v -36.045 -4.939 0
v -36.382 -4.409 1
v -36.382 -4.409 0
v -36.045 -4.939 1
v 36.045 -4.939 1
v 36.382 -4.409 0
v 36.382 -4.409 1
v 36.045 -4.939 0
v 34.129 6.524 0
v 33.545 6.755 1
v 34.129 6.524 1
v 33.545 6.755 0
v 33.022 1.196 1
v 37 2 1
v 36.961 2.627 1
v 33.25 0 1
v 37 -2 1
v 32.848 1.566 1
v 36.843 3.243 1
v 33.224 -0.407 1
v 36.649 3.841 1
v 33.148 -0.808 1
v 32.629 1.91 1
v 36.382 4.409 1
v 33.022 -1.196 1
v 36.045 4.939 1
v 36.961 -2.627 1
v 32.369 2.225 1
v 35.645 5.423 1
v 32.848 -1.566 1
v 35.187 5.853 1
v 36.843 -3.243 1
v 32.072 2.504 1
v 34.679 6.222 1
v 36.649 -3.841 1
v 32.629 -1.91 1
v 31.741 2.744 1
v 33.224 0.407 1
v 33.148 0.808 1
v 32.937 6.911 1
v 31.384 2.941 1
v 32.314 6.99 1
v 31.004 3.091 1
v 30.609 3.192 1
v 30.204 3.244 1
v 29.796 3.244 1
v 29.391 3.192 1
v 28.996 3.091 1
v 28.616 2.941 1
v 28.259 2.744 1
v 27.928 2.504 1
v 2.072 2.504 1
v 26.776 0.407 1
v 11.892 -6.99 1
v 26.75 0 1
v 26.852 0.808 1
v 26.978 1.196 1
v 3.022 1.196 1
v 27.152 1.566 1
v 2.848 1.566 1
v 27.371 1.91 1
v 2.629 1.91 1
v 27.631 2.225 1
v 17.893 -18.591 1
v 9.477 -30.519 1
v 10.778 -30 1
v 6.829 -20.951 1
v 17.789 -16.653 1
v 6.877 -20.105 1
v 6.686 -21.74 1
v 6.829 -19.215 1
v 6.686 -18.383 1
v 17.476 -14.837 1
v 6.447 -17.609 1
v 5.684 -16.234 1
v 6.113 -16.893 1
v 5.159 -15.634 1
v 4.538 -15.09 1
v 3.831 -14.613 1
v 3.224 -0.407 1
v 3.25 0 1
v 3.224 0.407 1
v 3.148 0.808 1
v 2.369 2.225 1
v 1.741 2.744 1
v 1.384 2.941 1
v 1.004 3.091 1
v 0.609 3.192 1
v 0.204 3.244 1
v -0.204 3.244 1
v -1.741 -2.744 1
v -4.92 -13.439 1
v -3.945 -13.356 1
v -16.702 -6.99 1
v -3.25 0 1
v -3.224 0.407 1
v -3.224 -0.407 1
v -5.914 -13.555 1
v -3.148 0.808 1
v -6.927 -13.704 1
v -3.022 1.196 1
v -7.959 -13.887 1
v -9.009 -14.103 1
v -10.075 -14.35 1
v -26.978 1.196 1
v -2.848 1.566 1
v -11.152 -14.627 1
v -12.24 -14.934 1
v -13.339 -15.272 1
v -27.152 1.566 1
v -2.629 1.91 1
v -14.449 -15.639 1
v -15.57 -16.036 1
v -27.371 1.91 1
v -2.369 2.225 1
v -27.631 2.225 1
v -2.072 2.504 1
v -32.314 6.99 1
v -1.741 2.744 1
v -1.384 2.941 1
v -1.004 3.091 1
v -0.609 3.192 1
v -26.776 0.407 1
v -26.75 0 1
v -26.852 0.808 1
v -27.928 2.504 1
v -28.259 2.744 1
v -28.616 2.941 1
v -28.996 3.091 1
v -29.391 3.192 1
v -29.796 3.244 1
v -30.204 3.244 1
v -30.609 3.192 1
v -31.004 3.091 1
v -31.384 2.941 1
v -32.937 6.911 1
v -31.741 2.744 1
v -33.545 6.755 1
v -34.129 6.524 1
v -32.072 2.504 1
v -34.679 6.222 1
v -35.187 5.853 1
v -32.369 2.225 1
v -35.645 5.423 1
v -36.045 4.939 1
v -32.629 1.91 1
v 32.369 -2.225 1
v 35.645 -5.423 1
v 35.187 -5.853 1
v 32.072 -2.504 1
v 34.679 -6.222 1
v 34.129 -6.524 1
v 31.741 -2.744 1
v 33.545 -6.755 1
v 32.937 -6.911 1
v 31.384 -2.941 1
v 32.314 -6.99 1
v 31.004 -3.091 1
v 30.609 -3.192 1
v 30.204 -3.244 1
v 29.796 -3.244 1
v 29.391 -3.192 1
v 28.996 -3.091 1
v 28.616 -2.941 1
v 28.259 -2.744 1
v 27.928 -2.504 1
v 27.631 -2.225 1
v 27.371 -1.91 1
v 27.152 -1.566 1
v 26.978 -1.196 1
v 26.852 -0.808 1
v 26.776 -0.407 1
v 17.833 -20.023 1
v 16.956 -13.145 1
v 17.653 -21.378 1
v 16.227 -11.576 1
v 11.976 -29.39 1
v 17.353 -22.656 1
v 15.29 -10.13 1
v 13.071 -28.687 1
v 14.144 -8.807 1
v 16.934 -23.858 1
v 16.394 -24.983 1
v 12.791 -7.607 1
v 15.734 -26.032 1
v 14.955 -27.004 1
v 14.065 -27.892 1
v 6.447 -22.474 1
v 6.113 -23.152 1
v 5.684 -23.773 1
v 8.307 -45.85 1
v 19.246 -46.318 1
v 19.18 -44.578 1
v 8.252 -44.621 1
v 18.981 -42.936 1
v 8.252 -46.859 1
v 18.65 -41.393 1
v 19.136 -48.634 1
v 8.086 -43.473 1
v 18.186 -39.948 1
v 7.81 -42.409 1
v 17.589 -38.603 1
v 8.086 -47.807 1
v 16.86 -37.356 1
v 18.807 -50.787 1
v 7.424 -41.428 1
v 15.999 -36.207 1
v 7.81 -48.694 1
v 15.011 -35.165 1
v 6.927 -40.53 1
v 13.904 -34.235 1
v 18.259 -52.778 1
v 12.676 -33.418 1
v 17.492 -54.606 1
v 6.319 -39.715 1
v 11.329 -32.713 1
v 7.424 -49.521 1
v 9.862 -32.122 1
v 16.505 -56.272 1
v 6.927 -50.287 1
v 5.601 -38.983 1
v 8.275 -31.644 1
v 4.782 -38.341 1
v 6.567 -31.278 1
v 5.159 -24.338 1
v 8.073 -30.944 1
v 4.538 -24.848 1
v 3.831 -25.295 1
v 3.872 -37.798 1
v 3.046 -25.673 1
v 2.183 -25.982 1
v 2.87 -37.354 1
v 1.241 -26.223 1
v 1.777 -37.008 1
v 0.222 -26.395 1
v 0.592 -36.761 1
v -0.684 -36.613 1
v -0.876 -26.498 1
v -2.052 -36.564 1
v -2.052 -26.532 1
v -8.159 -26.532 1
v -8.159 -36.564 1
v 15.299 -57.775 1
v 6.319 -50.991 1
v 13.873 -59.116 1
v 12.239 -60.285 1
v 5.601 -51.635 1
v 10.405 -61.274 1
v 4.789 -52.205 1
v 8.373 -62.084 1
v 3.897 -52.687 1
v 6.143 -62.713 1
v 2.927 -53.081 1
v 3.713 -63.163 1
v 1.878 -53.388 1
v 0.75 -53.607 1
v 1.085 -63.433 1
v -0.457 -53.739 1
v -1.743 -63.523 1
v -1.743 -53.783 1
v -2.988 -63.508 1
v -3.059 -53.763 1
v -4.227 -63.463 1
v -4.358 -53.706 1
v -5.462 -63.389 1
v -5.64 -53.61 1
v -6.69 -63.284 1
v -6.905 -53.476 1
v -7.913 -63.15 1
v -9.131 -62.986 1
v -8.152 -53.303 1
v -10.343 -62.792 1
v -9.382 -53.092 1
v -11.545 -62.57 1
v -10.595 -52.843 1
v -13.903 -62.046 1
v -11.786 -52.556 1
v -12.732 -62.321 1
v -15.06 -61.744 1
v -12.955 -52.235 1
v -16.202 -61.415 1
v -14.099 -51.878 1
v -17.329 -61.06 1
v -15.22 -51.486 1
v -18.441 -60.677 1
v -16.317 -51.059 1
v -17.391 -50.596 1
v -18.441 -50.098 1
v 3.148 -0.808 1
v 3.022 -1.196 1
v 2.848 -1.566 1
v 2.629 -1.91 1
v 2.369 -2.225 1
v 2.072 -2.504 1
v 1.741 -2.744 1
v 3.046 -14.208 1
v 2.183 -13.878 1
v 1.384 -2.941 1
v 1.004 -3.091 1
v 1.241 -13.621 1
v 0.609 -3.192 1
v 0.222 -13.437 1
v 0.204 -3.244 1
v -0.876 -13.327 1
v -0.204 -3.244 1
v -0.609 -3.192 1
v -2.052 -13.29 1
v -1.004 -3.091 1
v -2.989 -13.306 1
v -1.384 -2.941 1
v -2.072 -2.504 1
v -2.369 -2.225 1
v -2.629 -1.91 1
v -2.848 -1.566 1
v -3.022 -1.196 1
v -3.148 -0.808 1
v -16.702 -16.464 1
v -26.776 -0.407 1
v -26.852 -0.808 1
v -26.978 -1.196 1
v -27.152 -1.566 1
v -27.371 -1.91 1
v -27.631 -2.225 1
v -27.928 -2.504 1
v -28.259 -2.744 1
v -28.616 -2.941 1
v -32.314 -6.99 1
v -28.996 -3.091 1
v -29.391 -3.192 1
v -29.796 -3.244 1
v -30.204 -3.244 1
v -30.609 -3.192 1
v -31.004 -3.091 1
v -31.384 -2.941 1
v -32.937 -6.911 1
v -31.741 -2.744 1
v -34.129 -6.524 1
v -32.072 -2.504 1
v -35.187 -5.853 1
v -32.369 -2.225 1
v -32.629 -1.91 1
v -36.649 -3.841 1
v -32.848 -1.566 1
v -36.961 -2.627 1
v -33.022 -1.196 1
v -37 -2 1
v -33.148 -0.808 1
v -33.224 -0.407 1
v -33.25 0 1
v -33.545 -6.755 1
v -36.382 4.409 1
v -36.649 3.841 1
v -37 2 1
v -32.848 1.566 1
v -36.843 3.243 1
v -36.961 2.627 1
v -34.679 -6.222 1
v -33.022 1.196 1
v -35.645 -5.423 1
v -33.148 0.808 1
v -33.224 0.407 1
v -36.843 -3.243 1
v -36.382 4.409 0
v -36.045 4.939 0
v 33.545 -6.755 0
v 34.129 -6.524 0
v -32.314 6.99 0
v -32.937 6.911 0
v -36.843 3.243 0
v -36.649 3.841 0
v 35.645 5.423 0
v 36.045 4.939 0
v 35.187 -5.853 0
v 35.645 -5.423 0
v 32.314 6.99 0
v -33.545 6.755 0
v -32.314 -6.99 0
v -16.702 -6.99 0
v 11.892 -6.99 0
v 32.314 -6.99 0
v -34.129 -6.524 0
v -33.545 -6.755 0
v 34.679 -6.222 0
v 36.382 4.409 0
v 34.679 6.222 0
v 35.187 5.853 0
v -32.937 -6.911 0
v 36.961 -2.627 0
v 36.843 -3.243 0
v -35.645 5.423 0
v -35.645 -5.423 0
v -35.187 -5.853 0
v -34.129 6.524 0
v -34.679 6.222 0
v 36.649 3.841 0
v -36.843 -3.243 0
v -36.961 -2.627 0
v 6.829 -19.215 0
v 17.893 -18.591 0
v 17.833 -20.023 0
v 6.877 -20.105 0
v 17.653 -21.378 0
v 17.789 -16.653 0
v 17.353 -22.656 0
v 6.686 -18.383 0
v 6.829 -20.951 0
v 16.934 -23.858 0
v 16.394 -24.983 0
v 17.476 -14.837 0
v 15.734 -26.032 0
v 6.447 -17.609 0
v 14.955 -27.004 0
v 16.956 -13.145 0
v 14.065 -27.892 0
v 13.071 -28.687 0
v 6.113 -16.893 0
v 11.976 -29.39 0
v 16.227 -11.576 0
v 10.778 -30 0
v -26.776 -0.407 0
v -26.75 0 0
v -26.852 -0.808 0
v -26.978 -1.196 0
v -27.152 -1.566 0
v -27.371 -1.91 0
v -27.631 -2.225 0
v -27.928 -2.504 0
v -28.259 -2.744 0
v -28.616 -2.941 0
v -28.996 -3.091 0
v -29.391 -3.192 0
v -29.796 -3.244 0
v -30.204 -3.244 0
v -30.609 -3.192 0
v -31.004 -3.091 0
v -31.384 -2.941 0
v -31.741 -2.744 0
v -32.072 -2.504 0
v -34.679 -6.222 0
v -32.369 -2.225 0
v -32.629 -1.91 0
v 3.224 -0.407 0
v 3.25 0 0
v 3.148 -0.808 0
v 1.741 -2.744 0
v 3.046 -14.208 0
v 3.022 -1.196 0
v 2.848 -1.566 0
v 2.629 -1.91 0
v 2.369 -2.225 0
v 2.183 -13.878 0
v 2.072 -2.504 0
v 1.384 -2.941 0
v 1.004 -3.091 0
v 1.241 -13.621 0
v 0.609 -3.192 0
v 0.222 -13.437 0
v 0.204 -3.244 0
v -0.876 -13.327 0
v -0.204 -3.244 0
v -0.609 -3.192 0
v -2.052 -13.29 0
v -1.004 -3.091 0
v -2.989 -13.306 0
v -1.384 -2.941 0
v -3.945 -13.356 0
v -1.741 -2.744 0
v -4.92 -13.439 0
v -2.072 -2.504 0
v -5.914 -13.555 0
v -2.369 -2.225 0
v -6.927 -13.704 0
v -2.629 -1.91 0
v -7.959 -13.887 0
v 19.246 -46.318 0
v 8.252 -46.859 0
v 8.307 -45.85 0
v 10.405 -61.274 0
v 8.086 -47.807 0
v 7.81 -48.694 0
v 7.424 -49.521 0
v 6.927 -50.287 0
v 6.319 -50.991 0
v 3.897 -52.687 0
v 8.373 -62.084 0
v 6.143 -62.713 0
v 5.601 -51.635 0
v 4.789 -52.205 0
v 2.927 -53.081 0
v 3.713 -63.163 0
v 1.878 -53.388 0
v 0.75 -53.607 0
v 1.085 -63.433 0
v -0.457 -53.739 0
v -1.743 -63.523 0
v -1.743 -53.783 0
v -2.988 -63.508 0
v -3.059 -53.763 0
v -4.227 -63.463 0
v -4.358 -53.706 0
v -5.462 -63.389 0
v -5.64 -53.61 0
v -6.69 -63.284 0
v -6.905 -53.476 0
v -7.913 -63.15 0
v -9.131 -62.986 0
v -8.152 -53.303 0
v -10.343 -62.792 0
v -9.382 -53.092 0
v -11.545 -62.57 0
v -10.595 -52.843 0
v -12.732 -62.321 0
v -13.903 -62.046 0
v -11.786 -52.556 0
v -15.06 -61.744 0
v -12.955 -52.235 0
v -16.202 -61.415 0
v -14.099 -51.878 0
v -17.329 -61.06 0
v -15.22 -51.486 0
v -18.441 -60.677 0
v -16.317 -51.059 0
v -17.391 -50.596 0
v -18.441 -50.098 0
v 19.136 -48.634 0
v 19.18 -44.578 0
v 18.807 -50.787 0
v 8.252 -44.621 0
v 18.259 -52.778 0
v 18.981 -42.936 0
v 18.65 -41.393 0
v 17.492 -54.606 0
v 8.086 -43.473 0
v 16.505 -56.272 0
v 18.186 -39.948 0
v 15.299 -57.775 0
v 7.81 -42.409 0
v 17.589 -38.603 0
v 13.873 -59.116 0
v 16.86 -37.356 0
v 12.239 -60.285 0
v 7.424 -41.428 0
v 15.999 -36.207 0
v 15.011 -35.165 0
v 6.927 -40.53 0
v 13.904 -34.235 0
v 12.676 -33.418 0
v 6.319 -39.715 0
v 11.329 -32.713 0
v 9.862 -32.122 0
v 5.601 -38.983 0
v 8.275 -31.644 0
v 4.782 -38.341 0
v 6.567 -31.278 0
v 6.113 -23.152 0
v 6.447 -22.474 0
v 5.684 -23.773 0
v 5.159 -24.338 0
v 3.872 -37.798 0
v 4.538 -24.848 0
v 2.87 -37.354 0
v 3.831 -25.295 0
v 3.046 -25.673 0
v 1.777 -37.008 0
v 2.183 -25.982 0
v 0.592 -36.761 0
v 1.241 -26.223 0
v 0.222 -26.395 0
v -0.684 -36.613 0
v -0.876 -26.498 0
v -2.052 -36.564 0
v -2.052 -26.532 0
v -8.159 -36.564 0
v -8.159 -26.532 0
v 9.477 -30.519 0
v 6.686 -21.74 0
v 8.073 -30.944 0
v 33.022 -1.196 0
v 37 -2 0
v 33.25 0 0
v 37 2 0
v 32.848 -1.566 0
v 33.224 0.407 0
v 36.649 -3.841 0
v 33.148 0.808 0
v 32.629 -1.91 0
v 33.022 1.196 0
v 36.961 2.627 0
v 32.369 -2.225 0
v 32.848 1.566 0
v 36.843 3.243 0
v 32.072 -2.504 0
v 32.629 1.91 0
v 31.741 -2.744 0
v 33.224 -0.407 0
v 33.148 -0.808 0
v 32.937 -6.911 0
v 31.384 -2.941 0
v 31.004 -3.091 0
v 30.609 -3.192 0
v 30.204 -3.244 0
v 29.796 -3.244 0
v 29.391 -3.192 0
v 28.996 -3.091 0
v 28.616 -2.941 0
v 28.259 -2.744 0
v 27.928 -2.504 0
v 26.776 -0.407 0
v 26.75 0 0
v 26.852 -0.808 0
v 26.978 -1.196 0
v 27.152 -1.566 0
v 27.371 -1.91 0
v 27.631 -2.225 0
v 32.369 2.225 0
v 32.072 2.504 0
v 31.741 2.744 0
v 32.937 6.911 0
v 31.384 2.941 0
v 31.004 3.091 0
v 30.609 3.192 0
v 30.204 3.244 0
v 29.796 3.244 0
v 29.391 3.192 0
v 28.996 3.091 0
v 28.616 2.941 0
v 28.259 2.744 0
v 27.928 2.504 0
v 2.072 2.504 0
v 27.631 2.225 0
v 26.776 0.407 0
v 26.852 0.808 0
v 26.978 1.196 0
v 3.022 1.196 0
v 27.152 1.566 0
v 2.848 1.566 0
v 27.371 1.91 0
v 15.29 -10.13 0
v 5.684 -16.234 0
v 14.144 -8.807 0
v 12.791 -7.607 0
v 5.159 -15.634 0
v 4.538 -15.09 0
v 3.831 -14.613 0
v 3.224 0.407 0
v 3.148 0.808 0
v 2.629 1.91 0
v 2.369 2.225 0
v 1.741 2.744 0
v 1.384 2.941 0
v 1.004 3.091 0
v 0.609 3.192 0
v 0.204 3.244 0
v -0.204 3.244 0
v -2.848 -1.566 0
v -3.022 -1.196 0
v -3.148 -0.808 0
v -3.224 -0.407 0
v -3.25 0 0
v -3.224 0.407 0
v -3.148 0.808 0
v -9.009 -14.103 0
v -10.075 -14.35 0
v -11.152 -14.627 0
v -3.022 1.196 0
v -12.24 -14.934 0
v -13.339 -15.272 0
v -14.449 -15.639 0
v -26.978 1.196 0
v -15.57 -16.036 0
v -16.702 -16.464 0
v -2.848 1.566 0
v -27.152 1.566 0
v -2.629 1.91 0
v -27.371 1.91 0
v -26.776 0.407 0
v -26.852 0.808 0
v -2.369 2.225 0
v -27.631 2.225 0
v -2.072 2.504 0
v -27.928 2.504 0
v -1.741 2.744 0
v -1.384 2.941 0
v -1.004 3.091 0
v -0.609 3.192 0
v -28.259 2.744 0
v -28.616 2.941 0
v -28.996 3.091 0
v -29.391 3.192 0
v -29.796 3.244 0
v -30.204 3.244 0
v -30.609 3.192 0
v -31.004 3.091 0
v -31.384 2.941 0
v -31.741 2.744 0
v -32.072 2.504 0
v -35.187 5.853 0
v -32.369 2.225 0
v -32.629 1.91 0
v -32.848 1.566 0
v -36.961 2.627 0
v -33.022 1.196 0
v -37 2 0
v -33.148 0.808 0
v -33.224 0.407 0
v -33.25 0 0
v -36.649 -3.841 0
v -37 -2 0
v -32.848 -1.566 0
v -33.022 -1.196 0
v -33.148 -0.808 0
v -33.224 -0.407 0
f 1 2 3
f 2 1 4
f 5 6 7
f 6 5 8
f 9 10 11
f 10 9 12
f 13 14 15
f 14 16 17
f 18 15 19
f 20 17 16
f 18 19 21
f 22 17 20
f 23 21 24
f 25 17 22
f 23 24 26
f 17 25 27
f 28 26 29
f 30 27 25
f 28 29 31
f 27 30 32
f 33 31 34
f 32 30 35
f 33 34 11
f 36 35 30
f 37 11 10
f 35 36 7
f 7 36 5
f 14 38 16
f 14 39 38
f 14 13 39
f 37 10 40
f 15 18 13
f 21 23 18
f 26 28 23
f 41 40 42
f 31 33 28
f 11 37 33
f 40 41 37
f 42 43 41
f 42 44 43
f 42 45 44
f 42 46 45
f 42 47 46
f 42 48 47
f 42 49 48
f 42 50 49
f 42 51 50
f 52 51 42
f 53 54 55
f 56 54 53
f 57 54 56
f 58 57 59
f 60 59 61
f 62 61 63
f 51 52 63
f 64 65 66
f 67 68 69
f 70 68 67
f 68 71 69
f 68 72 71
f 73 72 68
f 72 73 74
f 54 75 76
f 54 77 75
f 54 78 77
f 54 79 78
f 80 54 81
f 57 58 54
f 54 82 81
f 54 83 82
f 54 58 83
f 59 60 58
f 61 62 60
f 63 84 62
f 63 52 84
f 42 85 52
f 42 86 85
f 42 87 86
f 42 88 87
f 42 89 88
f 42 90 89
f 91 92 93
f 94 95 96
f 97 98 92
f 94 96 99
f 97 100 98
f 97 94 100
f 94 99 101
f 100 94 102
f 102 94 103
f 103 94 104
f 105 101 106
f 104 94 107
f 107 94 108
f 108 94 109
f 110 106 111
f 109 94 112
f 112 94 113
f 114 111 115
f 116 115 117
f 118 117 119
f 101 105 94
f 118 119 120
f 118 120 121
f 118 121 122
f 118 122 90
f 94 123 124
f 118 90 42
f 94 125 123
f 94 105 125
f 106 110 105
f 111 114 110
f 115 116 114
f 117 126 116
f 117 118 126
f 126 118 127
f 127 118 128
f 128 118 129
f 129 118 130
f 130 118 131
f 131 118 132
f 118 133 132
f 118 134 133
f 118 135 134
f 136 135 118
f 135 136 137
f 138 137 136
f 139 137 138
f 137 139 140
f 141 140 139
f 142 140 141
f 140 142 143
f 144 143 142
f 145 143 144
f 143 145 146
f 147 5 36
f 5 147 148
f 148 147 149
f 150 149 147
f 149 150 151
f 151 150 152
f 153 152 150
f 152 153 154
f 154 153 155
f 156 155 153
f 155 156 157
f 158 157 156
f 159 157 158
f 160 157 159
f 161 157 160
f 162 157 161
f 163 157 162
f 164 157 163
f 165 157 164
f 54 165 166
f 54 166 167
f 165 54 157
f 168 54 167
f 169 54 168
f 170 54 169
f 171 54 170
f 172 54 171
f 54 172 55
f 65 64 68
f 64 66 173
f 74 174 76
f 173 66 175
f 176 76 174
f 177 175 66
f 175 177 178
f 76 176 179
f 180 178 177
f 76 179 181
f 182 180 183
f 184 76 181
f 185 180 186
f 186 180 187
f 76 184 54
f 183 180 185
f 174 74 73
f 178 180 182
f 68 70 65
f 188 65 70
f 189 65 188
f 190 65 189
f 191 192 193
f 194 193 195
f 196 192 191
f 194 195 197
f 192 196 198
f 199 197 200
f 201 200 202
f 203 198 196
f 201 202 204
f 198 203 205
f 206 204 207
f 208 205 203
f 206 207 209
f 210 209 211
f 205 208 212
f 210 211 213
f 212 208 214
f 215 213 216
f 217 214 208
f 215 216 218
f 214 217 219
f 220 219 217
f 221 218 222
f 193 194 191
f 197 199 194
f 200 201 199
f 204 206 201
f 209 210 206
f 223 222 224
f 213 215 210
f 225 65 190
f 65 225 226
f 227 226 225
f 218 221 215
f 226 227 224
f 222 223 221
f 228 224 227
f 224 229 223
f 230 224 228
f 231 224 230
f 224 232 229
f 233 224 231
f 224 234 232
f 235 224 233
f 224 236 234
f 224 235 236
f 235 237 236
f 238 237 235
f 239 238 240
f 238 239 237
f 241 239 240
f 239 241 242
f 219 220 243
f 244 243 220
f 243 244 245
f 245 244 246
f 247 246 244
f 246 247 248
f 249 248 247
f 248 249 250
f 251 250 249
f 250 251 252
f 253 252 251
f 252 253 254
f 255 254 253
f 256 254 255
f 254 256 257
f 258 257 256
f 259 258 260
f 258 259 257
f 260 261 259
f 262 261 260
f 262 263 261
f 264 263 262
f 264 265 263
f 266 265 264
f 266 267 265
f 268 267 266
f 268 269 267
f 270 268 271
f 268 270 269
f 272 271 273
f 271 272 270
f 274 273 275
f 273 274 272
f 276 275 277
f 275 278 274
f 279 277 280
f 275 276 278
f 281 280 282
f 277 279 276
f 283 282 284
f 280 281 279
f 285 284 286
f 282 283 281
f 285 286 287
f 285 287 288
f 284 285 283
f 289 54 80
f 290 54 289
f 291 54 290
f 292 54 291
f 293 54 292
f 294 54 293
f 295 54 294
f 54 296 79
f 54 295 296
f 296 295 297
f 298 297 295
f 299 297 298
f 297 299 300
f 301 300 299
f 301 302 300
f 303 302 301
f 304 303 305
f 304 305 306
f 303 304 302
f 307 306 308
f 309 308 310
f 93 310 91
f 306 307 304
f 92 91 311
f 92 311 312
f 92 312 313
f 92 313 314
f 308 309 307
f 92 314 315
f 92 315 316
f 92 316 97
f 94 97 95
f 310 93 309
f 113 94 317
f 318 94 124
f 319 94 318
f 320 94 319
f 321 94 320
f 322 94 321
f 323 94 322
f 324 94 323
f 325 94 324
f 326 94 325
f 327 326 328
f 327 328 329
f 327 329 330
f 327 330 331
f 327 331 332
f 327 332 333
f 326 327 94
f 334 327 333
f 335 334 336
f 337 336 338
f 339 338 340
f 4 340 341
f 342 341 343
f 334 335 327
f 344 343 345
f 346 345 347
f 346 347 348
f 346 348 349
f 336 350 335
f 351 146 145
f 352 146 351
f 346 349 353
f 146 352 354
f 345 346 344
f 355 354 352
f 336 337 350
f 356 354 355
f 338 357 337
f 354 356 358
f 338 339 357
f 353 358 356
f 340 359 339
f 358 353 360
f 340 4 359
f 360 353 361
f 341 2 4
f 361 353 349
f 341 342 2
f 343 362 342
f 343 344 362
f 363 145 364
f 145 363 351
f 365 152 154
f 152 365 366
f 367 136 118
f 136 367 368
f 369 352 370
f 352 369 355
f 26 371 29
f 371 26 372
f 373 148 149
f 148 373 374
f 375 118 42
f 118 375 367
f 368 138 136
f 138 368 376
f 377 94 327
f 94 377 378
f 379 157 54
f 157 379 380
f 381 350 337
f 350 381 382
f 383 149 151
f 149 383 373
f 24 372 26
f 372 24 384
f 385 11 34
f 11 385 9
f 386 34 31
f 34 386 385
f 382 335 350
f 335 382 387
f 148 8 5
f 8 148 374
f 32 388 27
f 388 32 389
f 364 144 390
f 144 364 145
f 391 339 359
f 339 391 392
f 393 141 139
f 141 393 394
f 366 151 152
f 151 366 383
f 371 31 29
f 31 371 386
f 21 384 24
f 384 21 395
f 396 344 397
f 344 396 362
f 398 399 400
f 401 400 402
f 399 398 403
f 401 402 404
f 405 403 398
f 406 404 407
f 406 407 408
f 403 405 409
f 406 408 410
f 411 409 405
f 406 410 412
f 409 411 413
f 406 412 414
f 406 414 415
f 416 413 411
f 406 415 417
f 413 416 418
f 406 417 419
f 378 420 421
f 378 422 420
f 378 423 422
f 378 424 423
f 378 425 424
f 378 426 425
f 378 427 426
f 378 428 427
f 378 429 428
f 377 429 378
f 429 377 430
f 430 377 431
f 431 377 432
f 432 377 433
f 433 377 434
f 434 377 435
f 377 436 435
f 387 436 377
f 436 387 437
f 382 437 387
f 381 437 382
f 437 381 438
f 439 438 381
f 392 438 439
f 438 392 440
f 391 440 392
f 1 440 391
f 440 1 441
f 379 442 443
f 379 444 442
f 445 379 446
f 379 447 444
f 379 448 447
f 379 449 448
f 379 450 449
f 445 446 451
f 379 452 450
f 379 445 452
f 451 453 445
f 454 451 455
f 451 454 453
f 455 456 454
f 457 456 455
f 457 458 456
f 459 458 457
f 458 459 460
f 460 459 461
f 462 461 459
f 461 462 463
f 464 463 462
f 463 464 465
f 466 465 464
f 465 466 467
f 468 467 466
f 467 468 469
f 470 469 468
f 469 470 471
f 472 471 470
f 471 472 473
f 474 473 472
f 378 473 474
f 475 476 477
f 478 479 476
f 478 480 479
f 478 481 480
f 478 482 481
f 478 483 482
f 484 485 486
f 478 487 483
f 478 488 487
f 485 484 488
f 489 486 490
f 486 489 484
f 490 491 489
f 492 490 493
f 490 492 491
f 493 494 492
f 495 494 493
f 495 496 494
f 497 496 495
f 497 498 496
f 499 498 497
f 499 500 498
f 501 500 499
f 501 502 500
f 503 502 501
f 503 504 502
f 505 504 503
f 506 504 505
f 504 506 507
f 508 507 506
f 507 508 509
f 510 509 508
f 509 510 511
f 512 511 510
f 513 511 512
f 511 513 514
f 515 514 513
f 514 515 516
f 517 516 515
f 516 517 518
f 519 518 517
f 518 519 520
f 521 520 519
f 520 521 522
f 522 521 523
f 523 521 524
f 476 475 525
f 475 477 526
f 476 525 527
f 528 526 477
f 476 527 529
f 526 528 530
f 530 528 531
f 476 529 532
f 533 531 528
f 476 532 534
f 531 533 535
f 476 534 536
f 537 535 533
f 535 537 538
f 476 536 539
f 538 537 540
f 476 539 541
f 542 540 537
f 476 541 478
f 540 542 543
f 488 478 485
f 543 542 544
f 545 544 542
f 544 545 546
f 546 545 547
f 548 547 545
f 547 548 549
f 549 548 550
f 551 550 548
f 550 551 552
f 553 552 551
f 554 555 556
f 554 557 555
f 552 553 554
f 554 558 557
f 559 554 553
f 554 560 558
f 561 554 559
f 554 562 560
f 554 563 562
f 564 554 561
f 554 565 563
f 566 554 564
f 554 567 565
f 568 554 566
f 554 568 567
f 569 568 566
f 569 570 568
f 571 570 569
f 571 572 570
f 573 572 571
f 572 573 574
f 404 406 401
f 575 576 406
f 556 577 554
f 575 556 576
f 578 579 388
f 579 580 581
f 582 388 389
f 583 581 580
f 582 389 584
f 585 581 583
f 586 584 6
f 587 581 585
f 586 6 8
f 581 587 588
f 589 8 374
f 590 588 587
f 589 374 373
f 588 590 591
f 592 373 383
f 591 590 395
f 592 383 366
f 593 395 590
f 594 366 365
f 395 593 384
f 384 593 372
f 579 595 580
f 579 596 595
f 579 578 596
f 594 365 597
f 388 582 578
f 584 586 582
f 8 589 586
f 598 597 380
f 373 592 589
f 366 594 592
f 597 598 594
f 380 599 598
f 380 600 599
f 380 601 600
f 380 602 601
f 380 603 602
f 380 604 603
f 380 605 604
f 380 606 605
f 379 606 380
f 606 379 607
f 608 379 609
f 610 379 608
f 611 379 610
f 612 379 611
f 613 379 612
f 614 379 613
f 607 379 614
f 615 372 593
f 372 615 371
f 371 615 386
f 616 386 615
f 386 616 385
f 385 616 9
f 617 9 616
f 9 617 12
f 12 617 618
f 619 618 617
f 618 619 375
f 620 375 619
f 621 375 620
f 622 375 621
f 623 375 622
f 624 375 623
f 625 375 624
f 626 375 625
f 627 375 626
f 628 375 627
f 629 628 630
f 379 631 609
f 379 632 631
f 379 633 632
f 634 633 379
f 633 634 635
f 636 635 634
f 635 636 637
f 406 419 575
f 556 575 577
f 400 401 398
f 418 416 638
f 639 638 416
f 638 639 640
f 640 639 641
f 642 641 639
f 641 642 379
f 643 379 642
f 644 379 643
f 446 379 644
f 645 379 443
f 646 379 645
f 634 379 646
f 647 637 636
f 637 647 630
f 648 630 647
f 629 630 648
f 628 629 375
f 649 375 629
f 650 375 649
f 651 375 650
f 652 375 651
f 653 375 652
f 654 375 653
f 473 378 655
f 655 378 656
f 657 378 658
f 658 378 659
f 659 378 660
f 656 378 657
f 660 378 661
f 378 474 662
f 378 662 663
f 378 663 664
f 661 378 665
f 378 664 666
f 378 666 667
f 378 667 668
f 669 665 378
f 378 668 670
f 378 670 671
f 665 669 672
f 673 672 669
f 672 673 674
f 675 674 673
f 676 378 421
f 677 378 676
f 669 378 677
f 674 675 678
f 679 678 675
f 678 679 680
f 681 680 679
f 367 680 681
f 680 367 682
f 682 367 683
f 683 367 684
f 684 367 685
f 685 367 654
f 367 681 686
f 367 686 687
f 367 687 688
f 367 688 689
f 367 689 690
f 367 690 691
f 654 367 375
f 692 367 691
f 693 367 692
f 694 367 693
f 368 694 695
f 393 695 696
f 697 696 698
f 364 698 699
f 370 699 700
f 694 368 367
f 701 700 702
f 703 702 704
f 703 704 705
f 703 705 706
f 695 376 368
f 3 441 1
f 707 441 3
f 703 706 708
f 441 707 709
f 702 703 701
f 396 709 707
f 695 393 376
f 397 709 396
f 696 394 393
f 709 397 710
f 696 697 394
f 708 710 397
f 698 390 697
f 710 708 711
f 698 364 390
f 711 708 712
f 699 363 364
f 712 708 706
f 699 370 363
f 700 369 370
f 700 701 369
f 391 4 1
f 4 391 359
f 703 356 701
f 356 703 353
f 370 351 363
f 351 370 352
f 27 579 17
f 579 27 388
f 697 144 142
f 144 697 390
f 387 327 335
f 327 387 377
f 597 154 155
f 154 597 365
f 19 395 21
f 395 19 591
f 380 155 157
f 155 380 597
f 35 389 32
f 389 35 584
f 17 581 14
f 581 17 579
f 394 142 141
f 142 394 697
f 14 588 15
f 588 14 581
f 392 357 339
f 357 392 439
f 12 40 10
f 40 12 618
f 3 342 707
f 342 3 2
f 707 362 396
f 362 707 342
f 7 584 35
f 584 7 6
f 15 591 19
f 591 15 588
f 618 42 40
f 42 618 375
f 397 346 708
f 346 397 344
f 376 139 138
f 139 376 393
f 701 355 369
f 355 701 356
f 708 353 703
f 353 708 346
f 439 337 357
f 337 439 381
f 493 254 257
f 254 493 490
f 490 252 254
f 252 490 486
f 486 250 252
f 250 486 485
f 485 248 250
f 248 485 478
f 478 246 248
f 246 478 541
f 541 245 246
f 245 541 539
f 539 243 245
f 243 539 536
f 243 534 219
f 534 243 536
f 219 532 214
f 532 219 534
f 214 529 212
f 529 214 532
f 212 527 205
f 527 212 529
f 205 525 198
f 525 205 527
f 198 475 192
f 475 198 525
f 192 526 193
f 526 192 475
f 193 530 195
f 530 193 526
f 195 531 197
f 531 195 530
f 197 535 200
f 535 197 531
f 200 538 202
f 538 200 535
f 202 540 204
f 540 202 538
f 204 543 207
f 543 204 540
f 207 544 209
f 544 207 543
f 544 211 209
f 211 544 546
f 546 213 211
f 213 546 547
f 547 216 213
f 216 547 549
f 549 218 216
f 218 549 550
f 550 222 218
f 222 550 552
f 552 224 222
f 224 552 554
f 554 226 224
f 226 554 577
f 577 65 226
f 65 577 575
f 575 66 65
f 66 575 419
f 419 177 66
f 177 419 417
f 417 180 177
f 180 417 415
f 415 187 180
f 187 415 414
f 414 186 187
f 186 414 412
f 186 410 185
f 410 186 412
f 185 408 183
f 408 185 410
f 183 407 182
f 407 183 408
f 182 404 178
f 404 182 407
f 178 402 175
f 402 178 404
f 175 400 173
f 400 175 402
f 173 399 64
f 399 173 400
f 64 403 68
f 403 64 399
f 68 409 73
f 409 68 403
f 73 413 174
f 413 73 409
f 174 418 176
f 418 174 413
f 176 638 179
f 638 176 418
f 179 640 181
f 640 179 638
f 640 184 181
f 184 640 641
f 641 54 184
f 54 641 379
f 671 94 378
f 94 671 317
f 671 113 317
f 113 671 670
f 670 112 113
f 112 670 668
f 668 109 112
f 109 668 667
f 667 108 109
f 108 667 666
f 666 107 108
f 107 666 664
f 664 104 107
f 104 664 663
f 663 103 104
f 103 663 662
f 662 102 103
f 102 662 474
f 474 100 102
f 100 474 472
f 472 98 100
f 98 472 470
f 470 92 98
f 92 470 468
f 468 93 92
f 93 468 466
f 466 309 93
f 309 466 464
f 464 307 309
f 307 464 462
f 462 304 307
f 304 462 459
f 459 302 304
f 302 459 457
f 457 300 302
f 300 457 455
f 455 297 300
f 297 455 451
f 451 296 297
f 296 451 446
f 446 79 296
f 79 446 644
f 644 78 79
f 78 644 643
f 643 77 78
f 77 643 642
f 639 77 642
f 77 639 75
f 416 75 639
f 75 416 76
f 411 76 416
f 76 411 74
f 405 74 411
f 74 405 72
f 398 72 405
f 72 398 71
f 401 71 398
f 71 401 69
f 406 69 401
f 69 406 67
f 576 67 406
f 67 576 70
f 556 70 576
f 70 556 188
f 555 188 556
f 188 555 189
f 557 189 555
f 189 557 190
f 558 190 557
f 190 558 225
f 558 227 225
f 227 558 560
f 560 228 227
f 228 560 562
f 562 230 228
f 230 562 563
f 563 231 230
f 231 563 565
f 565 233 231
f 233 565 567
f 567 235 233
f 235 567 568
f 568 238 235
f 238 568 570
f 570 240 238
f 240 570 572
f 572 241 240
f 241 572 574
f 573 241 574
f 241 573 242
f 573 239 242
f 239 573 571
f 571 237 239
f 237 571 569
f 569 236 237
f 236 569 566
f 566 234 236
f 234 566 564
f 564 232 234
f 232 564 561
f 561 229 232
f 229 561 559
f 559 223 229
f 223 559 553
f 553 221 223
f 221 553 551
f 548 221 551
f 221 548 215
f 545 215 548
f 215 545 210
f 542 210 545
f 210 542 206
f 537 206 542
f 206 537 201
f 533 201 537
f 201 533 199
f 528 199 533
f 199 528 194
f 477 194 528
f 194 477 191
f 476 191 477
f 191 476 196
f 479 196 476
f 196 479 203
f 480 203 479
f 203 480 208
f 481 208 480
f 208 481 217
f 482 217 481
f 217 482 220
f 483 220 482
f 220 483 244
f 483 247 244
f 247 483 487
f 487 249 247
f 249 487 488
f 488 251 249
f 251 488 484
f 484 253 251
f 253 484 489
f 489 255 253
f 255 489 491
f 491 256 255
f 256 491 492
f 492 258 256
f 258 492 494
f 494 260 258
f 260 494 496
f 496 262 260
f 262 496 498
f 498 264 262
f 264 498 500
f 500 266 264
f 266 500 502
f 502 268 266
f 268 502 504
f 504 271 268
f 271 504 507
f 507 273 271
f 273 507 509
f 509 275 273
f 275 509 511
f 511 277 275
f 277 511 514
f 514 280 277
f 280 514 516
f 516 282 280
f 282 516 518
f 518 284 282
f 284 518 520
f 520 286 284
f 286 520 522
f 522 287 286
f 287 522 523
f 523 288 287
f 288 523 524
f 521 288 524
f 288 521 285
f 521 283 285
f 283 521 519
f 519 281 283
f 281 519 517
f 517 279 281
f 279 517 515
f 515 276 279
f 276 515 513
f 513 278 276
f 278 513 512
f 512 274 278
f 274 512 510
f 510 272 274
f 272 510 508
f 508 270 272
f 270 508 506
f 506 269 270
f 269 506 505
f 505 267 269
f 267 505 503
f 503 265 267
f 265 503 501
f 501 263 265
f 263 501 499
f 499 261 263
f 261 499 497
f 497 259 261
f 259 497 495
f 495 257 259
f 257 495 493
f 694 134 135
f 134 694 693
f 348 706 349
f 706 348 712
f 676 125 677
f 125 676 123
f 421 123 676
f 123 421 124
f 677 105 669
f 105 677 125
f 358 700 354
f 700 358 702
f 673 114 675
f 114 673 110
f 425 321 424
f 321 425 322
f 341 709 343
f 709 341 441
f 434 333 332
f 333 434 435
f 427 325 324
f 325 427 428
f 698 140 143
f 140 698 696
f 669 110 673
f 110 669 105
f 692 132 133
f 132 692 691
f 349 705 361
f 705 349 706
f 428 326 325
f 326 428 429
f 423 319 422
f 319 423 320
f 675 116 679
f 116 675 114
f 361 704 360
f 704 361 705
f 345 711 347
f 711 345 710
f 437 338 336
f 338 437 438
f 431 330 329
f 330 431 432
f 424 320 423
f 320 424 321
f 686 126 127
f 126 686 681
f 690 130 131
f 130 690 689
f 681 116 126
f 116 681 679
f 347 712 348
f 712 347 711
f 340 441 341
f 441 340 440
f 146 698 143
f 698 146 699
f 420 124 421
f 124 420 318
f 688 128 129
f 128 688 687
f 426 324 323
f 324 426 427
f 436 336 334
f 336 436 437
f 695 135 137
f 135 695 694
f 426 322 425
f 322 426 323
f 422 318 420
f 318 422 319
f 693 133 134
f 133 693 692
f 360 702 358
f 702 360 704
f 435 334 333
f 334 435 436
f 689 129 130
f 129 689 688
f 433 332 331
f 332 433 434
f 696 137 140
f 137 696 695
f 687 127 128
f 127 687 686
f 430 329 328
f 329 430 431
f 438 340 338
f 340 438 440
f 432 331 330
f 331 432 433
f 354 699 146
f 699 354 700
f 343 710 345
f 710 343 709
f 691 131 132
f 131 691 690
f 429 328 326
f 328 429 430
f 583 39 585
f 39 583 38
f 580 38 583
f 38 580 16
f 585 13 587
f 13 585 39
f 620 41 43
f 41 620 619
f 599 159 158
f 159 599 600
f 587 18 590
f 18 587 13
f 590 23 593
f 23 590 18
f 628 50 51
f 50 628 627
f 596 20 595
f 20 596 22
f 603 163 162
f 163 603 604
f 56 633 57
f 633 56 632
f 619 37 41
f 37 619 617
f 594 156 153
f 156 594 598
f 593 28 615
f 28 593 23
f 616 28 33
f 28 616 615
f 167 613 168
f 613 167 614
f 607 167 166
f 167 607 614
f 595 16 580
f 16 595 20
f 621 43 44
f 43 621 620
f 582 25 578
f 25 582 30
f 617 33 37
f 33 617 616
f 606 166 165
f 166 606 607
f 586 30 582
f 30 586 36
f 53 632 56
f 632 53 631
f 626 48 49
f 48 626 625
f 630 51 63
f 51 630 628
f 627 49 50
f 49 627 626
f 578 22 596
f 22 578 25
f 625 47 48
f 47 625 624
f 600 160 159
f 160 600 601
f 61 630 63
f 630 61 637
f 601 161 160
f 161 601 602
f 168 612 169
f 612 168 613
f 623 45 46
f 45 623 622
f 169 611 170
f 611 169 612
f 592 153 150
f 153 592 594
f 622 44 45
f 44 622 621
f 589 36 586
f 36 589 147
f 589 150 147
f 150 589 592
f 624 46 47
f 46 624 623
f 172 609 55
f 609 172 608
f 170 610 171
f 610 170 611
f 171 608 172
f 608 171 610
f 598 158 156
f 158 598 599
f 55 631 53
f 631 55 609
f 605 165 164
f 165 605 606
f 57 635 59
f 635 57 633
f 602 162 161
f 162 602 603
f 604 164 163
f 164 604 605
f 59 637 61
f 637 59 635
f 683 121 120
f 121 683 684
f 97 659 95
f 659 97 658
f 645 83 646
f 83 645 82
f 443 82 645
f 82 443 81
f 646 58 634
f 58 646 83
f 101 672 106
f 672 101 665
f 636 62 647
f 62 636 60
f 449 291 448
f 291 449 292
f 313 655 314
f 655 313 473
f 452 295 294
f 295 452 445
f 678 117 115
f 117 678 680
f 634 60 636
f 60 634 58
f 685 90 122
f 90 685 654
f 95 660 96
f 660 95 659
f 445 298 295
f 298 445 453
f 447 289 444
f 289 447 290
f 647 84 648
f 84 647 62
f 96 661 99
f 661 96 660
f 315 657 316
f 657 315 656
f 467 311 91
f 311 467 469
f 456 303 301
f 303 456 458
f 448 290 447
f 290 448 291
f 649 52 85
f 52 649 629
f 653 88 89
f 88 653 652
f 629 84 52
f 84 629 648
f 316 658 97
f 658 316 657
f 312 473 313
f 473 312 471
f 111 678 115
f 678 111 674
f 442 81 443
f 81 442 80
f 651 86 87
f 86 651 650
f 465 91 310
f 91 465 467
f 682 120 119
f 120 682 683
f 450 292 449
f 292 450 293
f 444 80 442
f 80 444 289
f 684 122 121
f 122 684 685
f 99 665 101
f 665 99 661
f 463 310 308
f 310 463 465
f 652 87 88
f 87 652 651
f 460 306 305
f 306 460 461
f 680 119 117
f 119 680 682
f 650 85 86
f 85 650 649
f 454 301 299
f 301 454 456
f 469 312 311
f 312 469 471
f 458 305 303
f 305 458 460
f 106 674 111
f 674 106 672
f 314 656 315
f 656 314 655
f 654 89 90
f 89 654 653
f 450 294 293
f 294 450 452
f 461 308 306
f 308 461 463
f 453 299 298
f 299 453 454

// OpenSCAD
$fn = 50;


difference() {
	union() {
		translate(v = [0, 0, 0]) {
			rotate(a = [0, 0, 0]) {
				hull() {
					translate(v = [-32.0000000000, 2.0000000000, 0]) {
						rotate(a = [0, 0, 0]) {
							translate(v = [0, 0, 0]) {
								rotate(a = [0, 0, 0]) {
									cylinder(h = 1, r = 5);
								}
							}
						}
					}
					translate(v = [32.0000000000, 2.0000000000, 0]) {
						rotate(a = [0, 0, 0]) {
							translate(v = [0, 0, 0]) {
								rotate(a = [0, 0, 0]) {
									cylinder(h = 1, r = 5);
								}
							}
						}
					}
					translate(v = [-32.0000000000, -2.0000000000, 0]) {
						rotate(a = [0, 0, 0]) {
							translate(v = [0, 0, 0]) {
								rotate(a = [0, 0, 0]) {
									cylinder(h = 1, r = 5);
								}
							}
						}
					}
					translate(v = [32.0000000000, -2.0000000000, 0]) {
						rotate(a = [0, 0, 0]) {
							translate(v = [0, 0, 0]) {
								rotate(a = [0, 0, 0]) {
									cylinder(h = 1, r = 5);
								}
							}
						}
					}
				}
			}
		}
		translate(v = [0, -5, 0]) {
			rotate(a = [0, 0, 0]) {
				linear_extrude(height = 1) {
					text(font = "DejaVu Sans Mono:style=Bold", halign = "center", size = 57.0000000000, text = "3", valign = "top");
				}
			}
		}
	}
	union() {
		translate(v = [-30.0000000000, 0.0000000000, -125.0000000000]) {
			rotate(a = [0, 0, 0]) {
				cylinder(h = 250, r = 3.2500000000);
			}
		}
		translate(v = [30.0000000000, 0.0000000000, -125.0000000000]) {
			rotate(a = [0, 0, 0]) {
				cylinder(h = 250, r = 3.2500000000);
			}
		}
		translate(v = [30.0000000000, 0.0000000000, -125.0000000000]) {
			rotate(a = [0, 0, 0]) {
				cylinder(h = 250, r = 3.2500000000);
			}
		}
		translate(v = [0, 0, -125.0000000000]) {
			rotate(a = [0, 0, 0]) {
				cylinder(h = 250, r = 3.2500000000);
			}
		}
	}
}
